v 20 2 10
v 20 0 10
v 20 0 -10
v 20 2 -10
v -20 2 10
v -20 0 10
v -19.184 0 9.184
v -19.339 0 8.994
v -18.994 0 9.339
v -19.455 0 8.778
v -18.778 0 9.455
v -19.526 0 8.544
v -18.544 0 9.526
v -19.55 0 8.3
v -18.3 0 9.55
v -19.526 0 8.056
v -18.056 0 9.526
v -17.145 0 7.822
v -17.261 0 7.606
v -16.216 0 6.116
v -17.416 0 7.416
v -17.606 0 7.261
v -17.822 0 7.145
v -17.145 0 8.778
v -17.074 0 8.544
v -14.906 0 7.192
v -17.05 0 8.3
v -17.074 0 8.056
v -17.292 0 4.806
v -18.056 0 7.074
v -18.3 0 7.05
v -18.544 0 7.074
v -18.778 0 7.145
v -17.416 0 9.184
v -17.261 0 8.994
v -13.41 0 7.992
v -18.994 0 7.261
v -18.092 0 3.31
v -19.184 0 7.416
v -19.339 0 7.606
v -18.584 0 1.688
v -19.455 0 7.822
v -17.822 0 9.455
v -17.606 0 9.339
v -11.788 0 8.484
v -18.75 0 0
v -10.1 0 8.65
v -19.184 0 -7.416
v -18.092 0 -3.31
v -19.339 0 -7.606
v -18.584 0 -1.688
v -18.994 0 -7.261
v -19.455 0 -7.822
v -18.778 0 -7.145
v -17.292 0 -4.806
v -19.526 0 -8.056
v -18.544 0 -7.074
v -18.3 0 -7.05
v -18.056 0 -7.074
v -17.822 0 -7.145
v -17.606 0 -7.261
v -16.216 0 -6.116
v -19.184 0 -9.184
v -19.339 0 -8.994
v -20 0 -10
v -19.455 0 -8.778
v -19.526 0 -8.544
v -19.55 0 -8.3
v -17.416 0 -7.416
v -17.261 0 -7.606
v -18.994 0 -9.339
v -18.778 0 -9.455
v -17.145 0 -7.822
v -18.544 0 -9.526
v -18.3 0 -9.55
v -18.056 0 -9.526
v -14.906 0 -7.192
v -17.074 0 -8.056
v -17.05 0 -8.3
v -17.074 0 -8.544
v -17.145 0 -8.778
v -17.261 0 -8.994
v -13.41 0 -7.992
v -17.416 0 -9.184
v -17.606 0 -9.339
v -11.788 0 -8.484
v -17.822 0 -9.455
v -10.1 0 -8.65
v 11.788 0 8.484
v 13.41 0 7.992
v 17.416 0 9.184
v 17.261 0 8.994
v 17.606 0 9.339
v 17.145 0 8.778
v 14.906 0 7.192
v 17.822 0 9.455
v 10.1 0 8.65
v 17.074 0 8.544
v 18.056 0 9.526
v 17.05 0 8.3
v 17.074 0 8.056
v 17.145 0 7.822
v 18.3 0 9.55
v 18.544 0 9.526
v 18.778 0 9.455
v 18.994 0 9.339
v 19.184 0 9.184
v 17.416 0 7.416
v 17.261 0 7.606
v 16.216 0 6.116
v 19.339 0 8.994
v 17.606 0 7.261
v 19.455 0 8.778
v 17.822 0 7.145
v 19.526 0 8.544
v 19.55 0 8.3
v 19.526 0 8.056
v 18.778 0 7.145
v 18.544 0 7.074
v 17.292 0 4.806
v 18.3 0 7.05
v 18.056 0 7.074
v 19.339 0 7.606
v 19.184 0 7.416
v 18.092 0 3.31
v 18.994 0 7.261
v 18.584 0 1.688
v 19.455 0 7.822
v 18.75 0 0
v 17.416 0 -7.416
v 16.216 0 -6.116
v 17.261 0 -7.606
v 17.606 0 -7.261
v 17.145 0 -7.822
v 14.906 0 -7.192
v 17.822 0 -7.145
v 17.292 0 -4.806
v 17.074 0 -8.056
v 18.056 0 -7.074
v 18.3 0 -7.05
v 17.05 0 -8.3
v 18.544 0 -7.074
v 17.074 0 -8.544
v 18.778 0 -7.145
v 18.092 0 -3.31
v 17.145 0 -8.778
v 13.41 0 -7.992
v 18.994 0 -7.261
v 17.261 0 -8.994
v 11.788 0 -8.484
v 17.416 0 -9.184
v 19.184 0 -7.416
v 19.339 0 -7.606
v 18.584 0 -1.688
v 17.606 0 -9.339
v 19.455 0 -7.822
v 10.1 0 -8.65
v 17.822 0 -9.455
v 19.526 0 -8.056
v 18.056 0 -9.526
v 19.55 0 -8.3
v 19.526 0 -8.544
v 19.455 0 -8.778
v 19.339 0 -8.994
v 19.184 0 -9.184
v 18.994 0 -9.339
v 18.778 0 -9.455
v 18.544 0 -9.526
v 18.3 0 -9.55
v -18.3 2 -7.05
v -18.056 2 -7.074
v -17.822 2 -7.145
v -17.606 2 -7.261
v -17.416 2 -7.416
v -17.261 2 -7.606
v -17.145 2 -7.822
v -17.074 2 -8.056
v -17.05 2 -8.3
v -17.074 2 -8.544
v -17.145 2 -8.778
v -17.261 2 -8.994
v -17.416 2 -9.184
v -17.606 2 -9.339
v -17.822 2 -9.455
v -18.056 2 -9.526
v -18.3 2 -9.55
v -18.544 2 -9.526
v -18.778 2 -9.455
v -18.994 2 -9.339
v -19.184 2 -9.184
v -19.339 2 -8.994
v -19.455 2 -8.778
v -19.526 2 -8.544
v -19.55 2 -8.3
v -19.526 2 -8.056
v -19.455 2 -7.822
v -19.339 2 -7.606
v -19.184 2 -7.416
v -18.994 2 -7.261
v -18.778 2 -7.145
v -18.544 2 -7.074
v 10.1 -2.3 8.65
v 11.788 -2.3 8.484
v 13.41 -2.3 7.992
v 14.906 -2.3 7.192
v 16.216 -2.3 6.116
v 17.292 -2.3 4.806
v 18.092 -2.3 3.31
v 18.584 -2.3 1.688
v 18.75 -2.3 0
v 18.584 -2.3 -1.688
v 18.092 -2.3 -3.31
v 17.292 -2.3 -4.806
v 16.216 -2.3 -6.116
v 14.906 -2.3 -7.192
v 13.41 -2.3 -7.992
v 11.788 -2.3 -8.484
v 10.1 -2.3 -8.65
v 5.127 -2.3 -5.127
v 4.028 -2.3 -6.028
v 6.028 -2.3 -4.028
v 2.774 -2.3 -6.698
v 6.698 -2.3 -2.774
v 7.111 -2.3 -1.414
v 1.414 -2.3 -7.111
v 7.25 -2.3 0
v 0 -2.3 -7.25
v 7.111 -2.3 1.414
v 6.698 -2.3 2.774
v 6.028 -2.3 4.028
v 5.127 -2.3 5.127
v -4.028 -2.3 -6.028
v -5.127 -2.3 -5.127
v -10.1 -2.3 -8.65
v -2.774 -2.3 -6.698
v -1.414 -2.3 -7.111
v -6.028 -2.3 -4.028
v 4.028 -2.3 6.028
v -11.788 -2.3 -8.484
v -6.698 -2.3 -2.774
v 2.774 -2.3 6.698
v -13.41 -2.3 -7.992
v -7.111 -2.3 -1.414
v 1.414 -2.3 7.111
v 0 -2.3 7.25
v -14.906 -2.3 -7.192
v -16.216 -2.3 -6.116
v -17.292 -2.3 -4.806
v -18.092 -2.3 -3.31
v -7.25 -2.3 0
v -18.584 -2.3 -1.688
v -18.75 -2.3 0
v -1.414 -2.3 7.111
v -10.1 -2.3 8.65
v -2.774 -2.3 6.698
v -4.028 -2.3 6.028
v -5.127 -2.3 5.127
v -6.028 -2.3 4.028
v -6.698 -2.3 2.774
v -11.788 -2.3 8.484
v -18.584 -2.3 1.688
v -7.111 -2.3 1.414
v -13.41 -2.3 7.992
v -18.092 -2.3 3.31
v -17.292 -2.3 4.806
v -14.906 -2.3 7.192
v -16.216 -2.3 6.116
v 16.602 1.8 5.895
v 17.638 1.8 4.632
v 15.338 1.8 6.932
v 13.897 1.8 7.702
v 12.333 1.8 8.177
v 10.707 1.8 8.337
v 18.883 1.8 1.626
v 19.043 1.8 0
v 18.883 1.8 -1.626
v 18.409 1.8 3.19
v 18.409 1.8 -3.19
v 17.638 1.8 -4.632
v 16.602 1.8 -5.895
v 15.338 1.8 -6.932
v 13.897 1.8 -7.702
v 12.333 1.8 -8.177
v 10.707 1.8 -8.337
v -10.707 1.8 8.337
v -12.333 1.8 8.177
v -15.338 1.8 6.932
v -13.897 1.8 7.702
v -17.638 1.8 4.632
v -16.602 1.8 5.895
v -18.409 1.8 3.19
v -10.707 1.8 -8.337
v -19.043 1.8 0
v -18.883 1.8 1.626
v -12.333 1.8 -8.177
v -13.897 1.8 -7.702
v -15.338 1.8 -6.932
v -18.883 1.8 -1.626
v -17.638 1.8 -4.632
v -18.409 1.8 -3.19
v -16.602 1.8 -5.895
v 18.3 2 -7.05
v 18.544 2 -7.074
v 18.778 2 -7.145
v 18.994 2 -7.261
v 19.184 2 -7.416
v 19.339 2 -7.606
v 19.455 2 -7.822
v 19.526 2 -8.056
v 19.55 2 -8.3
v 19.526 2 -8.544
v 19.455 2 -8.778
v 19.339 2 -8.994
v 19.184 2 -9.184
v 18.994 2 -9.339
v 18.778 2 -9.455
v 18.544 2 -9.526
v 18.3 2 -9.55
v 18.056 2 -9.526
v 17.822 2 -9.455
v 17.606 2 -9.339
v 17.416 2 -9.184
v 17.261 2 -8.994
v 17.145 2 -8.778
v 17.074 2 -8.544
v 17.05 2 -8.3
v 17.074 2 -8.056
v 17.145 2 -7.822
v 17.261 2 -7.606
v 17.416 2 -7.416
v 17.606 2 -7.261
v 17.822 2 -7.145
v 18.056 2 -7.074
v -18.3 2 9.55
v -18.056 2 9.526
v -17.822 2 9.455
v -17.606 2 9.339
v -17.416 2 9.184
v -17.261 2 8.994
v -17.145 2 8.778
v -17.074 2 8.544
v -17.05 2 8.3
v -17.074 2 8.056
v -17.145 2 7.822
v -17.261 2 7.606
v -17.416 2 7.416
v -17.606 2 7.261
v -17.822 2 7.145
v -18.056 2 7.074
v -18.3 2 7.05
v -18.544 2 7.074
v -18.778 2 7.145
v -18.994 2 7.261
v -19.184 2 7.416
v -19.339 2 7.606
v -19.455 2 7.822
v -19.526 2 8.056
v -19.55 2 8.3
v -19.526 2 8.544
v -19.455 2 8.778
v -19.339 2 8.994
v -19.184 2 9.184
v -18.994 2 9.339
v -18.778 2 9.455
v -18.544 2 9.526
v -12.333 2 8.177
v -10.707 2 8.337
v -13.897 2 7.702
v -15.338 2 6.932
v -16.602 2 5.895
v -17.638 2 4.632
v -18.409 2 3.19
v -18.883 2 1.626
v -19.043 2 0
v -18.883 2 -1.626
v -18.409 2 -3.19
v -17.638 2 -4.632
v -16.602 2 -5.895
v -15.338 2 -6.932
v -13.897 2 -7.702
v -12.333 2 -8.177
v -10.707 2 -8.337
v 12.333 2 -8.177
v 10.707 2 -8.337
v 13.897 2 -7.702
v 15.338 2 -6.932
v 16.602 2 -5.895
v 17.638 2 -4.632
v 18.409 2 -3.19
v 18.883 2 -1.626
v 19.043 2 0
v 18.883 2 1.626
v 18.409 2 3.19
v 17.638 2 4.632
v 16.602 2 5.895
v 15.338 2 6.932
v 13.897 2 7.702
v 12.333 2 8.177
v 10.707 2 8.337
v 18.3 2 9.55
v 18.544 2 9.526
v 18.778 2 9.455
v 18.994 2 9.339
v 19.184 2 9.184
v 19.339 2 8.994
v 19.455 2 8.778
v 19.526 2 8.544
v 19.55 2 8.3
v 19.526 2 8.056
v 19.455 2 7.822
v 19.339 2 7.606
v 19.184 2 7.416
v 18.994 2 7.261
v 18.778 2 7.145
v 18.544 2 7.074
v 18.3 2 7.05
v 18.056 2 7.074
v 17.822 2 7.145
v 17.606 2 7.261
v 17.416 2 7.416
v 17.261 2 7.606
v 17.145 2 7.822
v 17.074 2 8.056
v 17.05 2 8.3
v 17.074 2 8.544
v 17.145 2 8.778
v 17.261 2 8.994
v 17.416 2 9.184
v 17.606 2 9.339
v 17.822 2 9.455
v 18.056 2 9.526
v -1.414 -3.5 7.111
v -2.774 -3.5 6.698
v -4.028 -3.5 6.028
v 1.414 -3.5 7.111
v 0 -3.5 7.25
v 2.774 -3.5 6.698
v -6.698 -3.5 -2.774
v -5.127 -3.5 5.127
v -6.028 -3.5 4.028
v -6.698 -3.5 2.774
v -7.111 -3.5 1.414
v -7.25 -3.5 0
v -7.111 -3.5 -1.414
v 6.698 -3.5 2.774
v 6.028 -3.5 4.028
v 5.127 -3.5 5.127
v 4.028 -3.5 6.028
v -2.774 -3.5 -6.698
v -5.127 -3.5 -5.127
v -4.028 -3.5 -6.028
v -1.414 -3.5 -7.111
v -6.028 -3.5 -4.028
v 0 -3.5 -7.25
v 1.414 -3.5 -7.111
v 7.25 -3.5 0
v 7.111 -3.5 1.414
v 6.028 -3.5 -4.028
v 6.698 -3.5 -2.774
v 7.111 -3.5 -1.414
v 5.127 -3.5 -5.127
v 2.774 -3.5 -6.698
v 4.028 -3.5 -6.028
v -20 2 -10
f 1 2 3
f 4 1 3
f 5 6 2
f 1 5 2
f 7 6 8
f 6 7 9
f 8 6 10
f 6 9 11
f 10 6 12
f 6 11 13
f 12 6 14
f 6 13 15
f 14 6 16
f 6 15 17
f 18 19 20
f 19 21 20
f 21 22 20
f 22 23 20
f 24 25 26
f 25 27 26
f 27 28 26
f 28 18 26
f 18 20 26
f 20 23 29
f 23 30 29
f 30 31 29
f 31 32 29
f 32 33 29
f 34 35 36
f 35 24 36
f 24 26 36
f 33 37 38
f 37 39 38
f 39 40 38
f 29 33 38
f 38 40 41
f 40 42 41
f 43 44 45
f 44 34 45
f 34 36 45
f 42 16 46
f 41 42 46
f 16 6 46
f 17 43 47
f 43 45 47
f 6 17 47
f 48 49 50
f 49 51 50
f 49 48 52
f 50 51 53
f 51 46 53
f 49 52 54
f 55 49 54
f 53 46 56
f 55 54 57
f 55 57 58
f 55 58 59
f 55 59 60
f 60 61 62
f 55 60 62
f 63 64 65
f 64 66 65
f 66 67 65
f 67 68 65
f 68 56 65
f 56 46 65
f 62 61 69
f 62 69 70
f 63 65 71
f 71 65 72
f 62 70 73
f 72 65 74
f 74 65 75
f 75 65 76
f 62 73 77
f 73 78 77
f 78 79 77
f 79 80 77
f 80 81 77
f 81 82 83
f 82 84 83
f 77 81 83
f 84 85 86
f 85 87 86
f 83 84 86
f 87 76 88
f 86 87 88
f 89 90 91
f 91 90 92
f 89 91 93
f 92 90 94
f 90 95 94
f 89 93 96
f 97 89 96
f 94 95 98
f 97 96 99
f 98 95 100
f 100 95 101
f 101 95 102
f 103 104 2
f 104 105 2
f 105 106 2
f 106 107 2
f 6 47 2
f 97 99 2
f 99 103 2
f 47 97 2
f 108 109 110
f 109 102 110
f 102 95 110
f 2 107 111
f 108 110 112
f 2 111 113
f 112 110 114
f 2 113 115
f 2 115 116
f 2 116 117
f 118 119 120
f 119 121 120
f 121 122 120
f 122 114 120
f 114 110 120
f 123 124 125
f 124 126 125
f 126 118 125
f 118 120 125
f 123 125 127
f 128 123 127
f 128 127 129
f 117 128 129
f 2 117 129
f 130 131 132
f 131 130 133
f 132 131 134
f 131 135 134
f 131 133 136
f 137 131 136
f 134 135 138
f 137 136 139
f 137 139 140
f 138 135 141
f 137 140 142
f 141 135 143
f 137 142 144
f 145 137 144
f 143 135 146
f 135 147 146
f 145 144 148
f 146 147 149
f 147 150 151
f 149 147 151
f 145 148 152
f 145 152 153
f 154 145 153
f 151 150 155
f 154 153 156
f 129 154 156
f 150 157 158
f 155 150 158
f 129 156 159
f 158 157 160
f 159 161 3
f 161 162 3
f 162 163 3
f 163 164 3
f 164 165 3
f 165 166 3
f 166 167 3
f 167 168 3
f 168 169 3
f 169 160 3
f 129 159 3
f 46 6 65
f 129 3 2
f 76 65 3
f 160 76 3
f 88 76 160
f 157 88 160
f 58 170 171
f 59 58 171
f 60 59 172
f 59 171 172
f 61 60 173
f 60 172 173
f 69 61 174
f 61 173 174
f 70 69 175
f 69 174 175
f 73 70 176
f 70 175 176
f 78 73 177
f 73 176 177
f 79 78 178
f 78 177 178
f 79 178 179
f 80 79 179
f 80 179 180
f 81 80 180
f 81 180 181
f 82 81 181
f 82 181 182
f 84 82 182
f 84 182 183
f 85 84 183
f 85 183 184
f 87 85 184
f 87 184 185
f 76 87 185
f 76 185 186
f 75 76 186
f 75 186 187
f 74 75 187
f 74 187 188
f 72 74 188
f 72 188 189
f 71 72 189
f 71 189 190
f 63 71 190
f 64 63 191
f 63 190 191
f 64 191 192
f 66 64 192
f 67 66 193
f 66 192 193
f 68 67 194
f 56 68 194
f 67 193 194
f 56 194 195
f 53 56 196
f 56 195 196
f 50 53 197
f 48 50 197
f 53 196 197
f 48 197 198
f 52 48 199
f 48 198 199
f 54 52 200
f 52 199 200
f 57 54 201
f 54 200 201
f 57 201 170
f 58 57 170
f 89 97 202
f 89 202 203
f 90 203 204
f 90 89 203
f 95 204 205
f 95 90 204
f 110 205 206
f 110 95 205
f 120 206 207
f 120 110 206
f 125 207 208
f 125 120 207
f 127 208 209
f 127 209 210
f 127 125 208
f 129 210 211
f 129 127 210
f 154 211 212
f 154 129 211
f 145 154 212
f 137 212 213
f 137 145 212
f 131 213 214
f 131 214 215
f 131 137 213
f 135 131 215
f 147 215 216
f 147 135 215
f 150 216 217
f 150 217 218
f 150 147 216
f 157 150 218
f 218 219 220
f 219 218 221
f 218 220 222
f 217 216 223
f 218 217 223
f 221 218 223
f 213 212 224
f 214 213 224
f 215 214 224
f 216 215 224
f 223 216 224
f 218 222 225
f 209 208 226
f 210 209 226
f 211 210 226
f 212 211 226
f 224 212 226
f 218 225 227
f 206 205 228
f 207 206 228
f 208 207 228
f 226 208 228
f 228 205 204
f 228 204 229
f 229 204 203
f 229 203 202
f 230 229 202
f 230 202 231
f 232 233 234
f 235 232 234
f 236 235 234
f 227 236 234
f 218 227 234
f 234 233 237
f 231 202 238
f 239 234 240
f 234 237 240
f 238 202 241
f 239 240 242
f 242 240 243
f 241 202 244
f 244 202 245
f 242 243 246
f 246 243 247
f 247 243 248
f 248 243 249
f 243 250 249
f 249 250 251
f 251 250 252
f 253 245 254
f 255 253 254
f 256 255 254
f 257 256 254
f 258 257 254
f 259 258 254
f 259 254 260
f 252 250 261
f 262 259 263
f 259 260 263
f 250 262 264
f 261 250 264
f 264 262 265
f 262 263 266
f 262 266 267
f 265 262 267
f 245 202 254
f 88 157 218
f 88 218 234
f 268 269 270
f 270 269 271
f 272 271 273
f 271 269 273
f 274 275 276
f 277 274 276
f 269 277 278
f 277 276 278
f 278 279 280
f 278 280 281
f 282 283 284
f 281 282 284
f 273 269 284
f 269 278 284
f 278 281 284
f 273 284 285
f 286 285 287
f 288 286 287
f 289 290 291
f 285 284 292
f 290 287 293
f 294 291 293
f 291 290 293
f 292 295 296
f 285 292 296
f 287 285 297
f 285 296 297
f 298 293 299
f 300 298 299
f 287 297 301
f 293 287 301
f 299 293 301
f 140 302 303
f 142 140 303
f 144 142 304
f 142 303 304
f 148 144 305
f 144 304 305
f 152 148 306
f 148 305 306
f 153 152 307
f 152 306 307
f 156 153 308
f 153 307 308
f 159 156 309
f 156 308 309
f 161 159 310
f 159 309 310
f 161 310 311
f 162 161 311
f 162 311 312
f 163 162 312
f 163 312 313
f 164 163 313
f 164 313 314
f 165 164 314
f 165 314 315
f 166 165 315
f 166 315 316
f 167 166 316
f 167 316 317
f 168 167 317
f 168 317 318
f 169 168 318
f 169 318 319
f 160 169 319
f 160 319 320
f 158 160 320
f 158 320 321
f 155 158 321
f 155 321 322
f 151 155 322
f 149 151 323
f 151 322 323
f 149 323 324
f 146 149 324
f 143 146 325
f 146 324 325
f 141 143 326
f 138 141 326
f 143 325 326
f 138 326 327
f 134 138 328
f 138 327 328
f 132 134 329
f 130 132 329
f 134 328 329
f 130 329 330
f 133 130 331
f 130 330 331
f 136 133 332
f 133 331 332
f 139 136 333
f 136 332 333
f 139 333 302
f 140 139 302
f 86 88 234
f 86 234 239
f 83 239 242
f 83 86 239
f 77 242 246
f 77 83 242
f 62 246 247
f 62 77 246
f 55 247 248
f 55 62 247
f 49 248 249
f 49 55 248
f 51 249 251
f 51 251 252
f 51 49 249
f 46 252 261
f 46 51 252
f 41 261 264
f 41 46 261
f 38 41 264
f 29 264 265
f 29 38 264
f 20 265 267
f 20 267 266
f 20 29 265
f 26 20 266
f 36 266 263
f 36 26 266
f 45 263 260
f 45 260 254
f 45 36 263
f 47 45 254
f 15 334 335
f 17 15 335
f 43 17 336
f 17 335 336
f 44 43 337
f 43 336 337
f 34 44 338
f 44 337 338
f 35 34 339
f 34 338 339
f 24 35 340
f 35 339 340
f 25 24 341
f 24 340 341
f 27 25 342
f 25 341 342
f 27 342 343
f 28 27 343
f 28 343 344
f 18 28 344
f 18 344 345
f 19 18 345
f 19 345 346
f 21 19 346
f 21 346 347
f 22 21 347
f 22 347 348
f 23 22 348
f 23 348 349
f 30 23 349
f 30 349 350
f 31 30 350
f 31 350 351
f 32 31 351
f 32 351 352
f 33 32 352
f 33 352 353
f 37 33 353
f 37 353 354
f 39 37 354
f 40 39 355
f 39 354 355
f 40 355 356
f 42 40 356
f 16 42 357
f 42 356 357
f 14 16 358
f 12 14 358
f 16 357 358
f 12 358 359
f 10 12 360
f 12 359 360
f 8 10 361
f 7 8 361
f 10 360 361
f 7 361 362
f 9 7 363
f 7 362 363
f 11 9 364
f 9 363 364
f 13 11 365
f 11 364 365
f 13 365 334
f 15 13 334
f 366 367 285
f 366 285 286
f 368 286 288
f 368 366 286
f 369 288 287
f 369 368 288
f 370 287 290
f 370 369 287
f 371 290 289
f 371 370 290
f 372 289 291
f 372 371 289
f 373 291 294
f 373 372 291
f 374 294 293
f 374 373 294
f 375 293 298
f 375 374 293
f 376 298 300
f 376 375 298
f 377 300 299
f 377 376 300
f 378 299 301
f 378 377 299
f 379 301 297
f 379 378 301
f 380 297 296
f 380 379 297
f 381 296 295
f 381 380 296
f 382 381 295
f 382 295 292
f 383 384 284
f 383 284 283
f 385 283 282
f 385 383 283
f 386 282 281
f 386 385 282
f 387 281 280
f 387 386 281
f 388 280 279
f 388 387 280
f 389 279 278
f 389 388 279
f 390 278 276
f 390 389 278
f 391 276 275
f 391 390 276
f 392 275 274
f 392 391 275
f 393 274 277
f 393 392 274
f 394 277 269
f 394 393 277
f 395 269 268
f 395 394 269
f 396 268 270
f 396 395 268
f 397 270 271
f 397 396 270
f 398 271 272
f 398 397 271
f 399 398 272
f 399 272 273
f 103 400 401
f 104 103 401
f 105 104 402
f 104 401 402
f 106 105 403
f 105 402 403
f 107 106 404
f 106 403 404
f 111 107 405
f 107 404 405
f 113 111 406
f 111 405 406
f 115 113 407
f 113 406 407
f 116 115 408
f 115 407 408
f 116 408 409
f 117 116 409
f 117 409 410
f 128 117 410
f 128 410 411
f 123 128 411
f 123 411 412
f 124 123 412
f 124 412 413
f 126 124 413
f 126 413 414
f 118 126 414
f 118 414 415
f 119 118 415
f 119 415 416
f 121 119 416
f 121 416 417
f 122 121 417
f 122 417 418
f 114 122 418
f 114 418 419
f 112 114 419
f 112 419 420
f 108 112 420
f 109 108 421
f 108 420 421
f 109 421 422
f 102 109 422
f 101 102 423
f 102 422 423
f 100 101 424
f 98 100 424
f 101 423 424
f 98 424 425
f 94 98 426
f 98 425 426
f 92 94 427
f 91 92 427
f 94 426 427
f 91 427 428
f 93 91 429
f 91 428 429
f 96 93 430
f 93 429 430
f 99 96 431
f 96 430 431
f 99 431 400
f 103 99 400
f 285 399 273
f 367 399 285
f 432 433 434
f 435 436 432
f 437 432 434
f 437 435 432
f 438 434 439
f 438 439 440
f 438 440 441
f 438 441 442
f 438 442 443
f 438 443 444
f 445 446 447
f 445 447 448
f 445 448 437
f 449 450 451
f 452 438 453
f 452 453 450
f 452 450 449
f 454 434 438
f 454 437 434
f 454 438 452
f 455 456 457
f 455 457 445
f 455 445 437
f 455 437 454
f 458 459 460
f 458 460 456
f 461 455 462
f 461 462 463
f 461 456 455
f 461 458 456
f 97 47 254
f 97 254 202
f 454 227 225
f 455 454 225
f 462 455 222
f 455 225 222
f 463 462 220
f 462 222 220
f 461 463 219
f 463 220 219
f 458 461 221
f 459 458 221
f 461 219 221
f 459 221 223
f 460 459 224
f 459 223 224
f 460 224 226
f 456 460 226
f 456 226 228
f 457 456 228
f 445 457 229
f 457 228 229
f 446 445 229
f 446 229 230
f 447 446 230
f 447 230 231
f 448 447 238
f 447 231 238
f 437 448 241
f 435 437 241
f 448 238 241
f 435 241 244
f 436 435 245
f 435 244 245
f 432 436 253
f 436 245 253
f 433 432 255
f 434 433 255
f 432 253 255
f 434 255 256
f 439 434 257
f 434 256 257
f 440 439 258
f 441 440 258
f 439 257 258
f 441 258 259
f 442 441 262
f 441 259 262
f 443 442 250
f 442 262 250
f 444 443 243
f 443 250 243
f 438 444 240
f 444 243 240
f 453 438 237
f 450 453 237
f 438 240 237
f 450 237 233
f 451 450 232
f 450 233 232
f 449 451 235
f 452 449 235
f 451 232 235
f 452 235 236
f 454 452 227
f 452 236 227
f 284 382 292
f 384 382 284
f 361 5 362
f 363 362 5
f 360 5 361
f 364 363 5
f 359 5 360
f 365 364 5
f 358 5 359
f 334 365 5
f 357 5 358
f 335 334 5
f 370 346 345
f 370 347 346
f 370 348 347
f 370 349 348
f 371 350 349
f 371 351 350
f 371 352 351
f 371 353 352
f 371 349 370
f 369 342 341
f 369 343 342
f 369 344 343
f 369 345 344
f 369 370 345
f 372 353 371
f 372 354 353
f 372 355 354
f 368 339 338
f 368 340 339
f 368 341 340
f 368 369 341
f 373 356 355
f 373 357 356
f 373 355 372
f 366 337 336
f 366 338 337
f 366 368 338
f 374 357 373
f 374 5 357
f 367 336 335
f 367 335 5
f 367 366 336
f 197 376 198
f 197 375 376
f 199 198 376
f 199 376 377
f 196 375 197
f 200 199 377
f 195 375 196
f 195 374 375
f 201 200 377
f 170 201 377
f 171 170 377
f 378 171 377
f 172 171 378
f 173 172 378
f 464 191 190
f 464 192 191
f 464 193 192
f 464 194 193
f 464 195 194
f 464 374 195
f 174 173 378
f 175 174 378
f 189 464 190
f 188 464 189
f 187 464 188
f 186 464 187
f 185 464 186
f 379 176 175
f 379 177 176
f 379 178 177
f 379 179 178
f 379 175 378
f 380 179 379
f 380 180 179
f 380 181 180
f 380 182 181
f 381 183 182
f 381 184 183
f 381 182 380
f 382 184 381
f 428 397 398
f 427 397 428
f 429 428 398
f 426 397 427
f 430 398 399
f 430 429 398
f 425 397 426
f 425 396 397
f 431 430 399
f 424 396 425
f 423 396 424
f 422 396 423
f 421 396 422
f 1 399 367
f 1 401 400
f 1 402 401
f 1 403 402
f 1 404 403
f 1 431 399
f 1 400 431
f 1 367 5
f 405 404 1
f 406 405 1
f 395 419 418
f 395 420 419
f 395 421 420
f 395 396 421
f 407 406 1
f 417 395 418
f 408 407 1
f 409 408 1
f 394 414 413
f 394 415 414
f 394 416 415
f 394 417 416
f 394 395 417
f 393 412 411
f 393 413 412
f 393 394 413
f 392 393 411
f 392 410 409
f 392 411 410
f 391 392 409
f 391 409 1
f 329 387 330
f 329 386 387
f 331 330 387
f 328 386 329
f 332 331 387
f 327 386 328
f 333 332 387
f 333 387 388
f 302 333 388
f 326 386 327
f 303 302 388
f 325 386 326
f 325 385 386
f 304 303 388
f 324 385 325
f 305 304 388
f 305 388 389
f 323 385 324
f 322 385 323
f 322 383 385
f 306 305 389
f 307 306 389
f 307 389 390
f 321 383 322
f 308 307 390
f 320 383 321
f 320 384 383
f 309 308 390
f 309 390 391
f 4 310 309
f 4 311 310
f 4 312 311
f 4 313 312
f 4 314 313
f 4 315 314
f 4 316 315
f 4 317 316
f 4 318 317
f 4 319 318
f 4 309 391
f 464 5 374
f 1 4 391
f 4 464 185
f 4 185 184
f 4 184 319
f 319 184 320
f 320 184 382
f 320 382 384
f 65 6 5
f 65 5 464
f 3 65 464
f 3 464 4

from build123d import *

# Parameters (mm, degrees)
SKETCH4_W           = 40
SKETCH4_H           = 20
BOSS_EXTRUDE2_DEPTH = 2
SKETCH5_R           = 1.25
CUT_EXTRUDE1_DEPTH  = 23.449944321
BOSS_EXTRUDE3_DEPTH = 2.3
SKETCH7_R           = 7.25
BOSS_EXTRUDE4_DEPTH = 1.2
CUT_EXTRUDE2_DEPTH  = 0.2


with BuildPart() as part:
    # Sketch4 → Boss-Extrude2 (new body)
    with BuildSketch(Plane(origin=(0, 0, 0), x_dir=(1, 0, 0), z_dir=(0, 1, 0))):
        Rectangle(SKETCH4_W, SKETCH4_H)
    extrude(amount=BOSS_EXTRUDE2_DEPTH)

    # Sketch5 → Cut-Extrude1 (cut, through all)
    with BuildSketch(Plane(origin=(0, 2, 0), x_dir=(1, 0, 0), z_dir=(0, 1, 0))):
        with Locations(Location((-18.3, 8.3, 0), (0, 0, 270))):
            Circle(SKETCH5_R)
        with Locations(Location((18.3, 8.3, 0), (0, 0, 270))):
            Circle(SKETCH5_R)
        with Locations(Location((-18.3, -8.3, 0), (0, 0, 270))):
            Circle(SKETCH5_R)
        with Locations(Location((18.3, -8.3, 0), (0, 0, 270))):
            Circle(SKETCH5_R)
    extrude(amount=-CUT_EXTRUDE1_DEPTH, mode=Mode.SUBTRACT)

    # Sketch6 → Boss-Extrude3 (add)
    with BuildSketch(Plane.XZ):
        with BuildLine():
            Line((-10.1, 8.65), (10.1, 8.65))
            ThreePointArc((10.1, 8.65), (18.75, 0), (10.1, -8.65))
            Line((10.1, -8.65), (-10.1, -8.65))
            ThreePointArc((-10.1, -8.65), (-18.75, 0), (-10.1, 8.65))
        make_face()
    extrude(amount=BOSS_EXTRUDE3_DEPTH)

    # Sketch7 → Boss-Extrude4 (add)
    with BuildSketch(Plane.XZ.offset(2.3)):
        with Locations(Location((0, 0, 0), (0, 0, 270))):
            Circle(SKETCH7_R)
    extrude(amount=BOSS_EXTRUDE4_DEPTH)

    # Sketch8 → Cut-Extrude2 (cut)
    with BuildSketch(Plane(origin=(0, 2, 0), x_dir=(1, 0, 0), z_dir=(0, 1, 0))):
        with BuildLine():
            Line((-10.706568747, 8.336924947), (10.706568747, 8.336924947))
            ThreePointArc((10.706568747, 8.336924947), (19.043493695, 0), (10.706568747, -8.336924947))
            Line((10.706568747, -8.336924947), (-10.706568747, -8.336924947))
            ThreePointArc((-10.706568747, -8.336924947), (-19.043493695, 0), (-10.706568747, 8.336924947))
        make_face()
    extrude(amount=-CUT_EXTRUDE2_DEPTH, mode=Mode.SUBTRACT)


solid = part.part
